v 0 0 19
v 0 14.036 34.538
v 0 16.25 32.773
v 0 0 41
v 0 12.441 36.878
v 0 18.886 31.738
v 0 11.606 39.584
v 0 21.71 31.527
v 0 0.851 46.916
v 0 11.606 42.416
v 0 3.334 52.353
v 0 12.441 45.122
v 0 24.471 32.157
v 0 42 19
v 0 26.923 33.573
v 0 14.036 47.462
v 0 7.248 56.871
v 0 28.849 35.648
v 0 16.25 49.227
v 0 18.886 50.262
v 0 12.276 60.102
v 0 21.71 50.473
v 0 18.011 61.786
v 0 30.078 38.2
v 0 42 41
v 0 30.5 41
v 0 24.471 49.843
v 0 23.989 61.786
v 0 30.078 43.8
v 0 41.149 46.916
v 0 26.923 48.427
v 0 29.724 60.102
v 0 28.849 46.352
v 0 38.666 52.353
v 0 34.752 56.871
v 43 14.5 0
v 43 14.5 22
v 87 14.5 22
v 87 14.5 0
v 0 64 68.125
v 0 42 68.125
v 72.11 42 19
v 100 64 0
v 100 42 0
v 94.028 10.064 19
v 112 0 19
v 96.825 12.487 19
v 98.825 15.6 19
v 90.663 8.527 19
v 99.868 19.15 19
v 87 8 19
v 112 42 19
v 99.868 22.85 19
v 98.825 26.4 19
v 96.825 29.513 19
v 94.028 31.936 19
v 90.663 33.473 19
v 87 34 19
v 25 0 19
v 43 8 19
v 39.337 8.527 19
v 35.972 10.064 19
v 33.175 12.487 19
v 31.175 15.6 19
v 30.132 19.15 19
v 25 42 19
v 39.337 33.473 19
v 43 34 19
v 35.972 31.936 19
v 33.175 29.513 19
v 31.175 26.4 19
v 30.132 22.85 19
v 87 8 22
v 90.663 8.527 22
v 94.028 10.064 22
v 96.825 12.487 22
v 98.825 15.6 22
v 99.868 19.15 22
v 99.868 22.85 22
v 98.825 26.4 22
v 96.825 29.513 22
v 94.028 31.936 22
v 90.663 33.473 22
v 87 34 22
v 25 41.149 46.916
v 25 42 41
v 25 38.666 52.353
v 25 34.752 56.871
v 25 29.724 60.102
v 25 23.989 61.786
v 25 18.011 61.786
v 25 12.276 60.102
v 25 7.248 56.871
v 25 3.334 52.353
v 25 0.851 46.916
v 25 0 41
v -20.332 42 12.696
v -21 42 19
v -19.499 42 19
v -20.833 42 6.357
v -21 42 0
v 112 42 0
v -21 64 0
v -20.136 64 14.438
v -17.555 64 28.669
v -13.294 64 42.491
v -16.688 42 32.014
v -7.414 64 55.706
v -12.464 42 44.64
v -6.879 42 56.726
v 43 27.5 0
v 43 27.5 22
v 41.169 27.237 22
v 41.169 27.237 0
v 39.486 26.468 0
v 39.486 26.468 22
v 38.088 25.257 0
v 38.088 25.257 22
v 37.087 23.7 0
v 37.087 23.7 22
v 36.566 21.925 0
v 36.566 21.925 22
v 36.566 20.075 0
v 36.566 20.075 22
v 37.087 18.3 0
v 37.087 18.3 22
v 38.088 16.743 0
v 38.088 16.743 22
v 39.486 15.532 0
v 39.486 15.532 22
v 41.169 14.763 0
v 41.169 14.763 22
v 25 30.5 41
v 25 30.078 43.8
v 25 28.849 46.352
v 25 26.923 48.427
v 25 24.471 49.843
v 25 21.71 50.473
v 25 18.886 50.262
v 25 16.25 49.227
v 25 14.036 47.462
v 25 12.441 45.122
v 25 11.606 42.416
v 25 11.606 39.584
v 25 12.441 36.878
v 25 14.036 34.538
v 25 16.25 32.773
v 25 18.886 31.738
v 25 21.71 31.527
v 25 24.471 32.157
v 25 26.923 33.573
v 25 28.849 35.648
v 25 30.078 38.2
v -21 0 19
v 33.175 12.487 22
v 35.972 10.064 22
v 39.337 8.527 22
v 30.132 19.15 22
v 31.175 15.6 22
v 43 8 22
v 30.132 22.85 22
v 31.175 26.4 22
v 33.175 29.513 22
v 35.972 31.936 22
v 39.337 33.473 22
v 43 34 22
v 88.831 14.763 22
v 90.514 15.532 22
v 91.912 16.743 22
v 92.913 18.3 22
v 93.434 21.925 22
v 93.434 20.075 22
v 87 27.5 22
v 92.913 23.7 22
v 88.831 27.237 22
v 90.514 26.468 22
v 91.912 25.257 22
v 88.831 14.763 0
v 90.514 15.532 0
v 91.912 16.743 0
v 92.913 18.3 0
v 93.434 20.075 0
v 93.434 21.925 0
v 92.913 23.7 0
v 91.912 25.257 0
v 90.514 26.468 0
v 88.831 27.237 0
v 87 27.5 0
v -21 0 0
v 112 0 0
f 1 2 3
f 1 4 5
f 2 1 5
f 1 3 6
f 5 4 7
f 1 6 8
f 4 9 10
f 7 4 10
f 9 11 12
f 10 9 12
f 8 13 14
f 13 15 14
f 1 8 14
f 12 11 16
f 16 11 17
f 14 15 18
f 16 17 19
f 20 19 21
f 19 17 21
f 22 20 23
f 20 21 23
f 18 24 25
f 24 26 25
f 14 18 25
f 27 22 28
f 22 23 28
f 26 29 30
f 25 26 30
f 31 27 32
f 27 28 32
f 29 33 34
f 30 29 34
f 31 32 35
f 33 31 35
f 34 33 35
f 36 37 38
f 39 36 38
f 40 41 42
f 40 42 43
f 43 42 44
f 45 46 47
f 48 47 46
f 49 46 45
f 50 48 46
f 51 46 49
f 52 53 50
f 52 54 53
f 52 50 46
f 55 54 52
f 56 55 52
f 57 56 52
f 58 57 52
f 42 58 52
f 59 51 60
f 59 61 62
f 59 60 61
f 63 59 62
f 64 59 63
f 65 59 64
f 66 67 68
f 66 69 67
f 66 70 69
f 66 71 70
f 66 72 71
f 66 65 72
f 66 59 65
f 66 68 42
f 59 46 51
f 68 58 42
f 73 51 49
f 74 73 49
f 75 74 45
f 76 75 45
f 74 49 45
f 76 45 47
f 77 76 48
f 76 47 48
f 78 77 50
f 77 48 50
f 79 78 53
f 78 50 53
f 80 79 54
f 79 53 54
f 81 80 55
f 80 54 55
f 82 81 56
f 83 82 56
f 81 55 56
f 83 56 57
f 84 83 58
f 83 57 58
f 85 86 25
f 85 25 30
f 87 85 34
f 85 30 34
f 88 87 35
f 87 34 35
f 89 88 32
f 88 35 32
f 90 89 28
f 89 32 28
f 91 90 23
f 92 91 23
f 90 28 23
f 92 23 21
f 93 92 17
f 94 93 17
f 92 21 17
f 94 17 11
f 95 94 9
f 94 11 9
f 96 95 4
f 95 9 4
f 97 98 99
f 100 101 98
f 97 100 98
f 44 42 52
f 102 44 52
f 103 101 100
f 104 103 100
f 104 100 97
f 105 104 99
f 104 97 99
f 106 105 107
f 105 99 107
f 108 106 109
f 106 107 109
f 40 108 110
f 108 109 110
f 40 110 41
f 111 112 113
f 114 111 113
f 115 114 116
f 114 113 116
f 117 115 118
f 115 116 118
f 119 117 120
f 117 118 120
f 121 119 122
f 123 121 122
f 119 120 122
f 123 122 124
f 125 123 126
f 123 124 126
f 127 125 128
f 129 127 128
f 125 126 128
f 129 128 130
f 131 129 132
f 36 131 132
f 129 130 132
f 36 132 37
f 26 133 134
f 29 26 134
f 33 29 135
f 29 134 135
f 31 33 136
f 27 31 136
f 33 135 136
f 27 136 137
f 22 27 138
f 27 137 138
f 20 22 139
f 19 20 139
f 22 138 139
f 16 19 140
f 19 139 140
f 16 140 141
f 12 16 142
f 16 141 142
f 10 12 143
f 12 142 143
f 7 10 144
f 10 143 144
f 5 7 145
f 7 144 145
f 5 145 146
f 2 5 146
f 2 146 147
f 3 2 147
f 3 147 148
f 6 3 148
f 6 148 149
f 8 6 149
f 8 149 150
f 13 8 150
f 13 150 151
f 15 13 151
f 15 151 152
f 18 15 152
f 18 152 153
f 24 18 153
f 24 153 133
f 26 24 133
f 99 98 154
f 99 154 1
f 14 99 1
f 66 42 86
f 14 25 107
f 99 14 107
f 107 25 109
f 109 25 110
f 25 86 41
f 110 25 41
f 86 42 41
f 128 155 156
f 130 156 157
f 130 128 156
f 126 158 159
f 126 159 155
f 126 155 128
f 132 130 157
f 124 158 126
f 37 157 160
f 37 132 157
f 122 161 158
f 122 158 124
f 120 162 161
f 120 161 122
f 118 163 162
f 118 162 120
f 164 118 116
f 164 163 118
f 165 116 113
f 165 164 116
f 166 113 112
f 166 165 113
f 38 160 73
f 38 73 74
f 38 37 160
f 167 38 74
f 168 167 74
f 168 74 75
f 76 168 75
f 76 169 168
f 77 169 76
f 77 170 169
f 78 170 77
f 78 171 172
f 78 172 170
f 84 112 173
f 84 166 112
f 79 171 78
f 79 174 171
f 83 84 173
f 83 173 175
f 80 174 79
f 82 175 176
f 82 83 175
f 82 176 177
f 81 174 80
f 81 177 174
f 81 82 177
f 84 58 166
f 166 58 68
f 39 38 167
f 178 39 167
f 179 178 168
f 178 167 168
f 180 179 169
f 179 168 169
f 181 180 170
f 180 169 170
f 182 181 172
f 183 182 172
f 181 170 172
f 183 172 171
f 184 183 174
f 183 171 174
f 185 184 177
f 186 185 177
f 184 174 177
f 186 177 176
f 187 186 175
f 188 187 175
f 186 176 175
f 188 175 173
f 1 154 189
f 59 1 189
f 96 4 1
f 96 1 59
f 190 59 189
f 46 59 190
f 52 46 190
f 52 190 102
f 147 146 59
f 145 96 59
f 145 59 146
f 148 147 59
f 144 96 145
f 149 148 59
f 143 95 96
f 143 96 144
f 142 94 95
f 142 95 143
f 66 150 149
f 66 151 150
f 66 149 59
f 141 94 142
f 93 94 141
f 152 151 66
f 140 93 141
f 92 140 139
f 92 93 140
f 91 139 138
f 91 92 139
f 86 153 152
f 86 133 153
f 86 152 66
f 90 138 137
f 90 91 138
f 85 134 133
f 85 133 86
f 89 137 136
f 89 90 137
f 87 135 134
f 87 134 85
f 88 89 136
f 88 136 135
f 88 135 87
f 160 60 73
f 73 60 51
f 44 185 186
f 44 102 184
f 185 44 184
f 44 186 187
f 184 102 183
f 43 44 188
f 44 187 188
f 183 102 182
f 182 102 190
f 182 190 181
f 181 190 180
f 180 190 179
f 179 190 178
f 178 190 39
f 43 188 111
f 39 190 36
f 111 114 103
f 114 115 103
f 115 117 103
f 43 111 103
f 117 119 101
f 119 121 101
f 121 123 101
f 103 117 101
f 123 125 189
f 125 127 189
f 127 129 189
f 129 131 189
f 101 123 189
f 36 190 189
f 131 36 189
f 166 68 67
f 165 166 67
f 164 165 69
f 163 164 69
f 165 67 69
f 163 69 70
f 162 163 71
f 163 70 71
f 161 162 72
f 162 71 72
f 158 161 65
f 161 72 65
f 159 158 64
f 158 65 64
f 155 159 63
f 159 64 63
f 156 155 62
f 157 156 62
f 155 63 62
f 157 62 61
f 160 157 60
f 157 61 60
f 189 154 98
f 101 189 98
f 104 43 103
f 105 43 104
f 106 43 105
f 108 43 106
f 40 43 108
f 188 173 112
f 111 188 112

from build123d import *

# Parameters (mm, degrees)
F0_W      = 42
F0_H      = 19
F1_DEPTH  = 133
F2_DEPTH  = 25
F3_W      = 21
F3_H      = 42
F4_DEPTH  = 19
F5_R      = 9.5
F6_DEPTH  = 46.001
F7_W      = 21
F7_H      = 42
F8_DEPTH  = 19.001
F10_DEPTH = 3
F11_DEPTH = 19.001
F13_DEPTH = 22


with BuildPart() as f1:
    # F0 (on Right) → F1 (new body)
    with BuildSketch(Plane.YZ):
        with Locations((21, 9.5)):
            Rectangle(F0_W, F0_H)
    extrude(amount=F1_DEPTH)

    # F0 (on Right) → F2 (join)
    with BuildSketch(Plane.YZ):
        with BuildLine():
            Line((0, 41), (0, 19))
            Line((0, 19), (42, 19))
            Line((42, 19), (42, 41))
            ThreePointArc((42, 41), (21, 62), (0, 41))
        make_face()
    extrude(amount=F2_DEPTH)

    # F3 (on face) → F4 (join)
    with BuildSketch(Plane.XY.offset(19)):
        with Locations((-10.5, 21)):
            Rectangle(F3_W, F3_H)
    extrude(amount=-F4_DEPTH)

    # F5 (on face) → F6 (cut, through all)
    with BuildSketch(Plane.YZ.offset(25)):
        with Locations((21, 41)):
            Circle(F5_R)
    extrude(amount=-F6_DEPTH, mode=Mode.SUBTRACT)

    # F7 (on face) → F8 (cut, through all)
    with BuildSketch(Plane.XY.offset(19)):
        with Locations((122.5, 21)):
            Rectangle(F7_W, F7_H)
    extrude(amount=-F8_DEPTH, mode=Mode.SUBTRACT)

    # F9 (on face) → F10 (join)
    with BuildSketch(Plane.XY.offset(19)):
        with BuildLine():
            Line((87, 34), (43, 34))
            ThreePointArc((43, 34), (30, 21), (43, 8))
            Line((43, 8), (87, 8))
            ThreePointArc((87, 8), (100, 21), (87, 34))
        make_face()
        with BuildLine():
            ThreePointArc((43, 14.5), (36.5, 21), (43, 27.5))
            Line((43, 27.5), (87, 27.5))
            ThreePointArc((87, 27.5), (93.5, 21), (87, 14.5))
            Line((87, 14.5), (43, 14.5))
        make_face(mode=Mode.SUBTRACT)
    extrude(amount=F10_DEPTH)

    # F9 (on face) → F11 (cut, through all)
    with BuildSketch(Plane.XY.offset(19)):
        with BuildLine():
            Line((87, 27.5), (43, 27.5))
            ThreePointArc((43, 27.5), (36.5, 21), (43, 14.5))
            Line((43, 14.5), (87, 14.5))
            ThreePointArc((87, 14.5), (93.5, 21), (87, 27.5))
        make_face()
    extrude(amount=-F11_DEPTH, mode=Mode.SUBTRACT)

    # F12 (on face) → F13 (join)
    with BuildSketch(Plane(origin=(0, 42, 0), x_dir=(-1, 0, 0), z_dir=(0, 1, 0))):
        with BuildLine():
            Line((-100, 0), (21, 0))
            ThreePointArc((21, 0), (15.630878, 35.644074), (0, 68.124885))
            Line((0, 68.124885), (-100, 0))
        make_face()
    extrude(amount=F13_DEPTH)


solid = f1.part
